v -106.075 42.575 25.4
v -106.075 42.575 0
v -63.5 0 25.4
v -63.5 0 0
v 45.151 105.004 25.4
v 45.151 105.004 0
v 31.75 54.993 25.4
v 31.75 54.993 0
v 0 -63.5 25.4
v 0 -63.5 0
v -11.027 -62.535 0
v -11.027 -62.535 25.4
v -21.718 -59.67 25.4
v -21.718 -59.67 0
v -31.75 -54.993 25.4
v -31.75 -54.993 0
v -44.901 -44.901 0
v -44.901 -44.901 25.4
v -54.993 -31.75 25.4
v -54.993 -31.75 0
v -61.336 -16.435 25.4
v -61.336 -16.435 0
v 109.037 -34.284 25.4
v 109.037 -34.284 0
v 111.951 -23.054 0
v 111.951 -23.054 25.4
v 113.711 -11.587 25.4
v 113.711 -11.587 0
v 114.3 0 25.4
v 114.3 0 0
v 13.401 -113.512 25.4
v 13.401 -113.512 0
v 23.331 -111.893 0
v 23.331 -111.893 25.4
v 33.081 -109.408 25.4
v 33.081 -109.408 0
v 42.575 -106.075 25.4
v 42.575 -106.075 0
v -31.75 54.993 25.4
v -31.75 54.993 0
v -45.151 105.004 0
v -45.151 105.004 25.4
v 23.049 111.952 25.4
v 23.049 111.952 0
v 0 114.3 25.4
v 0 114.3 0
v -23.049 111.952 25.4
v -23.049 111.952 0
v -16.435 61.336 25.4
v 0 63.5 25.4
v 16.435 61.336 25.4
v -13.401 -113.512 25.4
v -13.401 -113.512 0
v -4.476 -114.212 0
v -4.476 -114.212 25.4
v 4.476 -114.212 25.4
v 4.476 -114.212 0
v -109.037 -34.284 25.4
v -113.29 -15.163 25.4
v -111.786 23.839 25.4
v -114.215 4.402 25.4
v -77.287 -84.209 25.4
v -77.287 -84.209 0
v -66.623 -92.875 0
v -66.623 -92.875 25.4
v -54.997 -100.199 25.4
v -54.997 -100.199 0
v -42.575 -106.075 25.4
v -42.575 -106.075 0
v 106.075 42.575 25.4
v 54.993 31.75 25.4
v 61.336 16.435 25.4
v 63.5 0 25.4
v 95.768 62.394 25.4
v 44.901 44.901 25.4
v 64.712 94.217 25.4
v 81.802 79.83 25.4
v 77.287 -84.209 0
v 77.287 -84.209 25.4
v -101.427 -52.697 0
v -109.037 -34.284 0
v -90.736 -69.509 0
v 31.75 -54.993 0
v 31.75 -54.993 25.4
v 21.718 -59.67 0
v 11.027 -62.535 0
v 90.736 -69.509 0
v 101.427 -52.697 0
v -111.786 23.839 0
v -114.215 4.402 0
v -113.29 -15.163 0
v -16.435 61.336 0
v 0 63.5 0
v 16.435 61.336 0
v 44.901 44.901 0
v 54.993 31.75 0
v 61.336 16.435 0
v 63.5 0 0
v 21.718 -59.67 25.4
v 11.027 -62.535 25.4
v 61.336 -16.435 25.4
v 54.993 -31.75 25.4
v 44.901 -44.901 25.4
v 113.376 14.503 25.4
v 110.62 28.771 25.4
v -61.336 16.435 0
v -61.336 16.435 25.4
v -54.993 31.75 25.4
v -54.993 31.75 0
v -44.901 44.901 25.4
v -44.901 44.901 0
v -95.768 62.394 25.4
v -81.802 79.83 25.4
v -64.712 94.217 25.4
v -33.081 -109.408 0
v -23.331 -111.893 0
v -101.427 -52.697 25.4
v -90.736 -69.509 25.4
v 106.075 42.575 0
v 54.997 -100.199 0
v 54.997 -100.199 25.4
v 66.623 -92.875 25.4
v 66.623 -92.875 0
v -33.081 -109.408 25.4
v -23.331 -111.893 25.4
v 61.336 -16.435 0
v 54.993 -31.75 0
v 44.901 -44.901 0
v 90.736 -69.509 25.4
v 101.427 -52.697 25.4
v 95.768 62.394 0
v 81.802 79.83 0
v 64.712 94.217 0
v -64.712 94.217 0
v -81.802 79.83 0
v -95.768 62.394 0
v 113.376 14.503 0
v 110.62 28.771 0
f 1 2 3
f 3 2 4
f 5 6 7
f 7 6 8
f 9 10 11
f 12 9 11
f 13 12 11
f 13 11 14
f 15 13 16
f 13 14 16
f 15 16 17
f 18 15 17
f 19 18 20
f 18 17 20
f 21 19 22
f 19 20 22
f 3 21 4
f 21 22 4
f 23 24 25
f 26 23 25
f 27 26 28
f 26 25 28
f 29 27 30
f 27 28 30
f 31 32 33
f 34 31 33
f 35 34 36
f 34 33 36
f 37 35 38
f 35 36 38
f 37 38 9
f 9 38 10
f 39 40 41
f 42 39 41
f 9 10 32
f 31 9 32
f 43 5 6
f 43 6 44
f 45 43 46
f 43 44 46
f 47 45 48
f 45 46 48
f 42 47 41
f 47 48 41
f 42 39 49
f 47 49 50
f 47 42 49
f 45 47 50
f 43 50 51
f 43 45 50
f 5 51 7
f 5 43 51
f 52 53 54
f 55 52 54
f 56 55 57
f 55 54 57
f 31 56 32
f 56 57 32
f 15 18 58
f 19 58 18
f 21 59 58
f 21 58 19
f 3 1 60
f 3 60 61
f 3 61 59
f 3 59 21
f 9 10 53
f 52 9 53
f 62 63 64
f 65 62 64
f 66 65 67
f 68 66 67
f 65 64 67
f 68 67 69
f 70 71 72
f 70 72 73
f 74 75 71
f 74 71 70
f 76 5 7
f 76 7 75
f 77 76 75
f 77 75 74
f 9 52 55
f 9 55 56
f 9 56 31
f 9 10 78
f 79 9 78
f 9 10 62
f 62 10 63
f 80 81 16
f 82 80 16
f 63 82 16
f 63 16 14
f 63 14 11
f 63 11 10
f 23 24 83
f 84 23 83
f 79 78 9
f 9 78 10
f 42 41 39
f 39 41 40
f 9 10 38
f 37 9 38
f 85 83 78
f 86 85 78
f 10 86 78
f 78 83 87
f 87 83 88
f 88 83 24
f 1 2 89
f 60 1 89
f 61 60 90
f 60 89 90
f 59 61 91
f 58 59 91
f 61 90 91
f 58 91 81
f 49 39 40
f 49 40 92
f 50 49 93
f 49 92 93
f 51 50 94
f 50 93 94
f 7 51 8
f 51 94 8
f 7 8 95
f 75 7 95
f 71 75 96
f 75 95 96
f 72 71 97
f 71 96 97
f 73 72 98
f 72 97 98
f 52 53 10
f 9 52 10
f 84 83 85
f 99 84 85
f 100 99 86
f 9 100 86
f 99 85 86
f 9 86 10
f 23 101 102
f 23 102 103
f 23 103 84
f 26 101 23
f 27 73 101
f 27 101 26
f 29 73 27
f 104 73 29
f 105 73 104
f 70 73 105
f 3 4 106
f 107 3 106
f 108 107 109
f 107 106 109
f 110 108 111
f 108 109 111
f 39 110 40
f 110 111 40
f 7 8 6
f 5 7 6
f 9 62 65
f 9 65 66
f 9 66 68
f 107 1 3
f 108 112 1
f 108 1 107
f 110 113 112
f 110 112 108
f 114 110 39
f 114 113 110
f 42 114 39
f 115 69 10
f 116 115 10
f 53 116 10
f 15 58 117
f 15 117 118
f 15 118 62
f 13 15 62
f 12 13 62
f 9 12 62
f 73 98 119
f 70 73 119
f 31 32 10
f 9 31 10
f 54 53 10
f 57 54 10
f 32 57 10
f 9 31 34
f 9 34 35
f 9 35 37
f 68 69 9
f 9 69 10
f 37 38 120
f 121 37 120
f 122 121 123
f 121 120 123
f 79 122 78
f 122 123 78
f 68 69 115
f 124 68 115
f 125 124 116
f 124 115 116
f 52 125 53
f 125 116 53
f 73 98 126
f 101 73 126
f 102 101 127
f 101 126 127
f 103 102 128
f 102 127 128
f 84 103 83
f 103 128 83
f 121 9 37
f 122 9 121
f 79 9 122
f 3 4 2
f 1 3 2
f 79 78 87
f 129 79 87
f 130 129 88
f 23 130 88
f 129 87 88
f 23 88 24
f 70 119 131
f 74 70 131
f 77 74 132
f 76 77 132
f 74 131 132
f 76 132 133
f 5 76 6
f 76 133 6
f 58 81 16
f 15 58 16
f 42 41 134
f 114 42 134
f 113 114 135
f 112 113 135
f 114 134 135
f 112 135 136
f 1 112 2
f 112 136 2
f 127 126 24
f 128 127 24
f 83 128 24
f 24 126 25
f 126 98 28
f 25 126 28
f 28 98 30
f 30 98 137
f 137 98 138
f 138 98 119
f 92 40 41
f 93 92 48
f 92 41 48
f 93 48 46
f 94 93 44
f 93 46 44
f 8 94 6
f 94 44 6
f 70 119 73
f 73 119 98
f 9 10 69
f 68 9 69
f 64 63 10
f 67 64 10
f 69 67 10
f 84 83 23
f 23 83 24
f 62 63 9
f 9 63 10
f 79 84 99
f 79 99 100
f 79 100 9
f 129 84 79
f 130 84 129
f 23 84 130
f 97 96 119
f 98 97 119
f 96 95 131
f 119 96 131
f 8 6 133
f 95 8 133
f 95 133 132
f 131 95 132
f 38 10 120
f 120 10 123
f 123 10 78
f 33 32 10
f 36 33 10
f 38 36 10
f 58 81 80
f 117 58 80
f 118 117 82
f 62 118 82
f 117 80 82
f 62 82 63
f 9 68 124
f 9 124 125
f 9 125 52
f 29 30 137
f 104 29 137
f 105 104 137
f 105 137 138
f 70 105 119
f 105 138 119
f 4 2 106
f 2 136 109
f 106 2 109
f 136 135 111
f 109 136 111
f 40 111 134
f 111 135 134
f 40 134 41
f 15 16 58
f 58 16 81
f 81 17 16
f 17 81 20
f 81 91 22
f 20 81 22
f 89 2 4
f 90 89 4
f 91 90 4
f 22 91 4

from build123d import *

# Parameters (mm, degrees)
F1_DEPTH = 25.4
F2_DEPTH = 25.4


with BuildPart() as f1:
    # F0 (on Top) → F1 (new body)
    with BuildSketch(Plane.XY):
        with BuildLine():
            Line((-63.5, 0), (-106.0748444331, 42.5748444331))
            ThreePointArc((-106.0748444331, 42.5748444331), (-114.2151898846, 4.4023175283), (-109.0372792311, -34.2835490851))
            Line((-109.0372792311, -34.2835490851), (-31.75, -54.9926131403))
            ThreePointArc((-31.75, -54.9926131403), (-54.9926131403, -31.75), (-63.5, 0))
        make_face()
    extrude(amount=F1_DEPTH)


with BuildPart() as f1b:
    # F0 (on Top) → F1, piece 2 (new body)
    with BuildSketch(Plane.XY):
        with BuildLine():
            Line((-42.5748444331, -106.0748444331), (0, -63.5))
            Line((0, -63.5), (-77.2872792311, -84.2090640552))
            ThreePointArc((-77.2872792311, -84.2090640552), (-60.9201137573, -96.712097174), (-42.5748444331, -106.0748444331))
        make_face()
    extrude(amount=F1_DEPTH)


with BuildPart() as f1c:
    # F0 (on Top) → F1, piece 3 (new body)
    with BuildSketch(Plane.XY):
        with BuildLine():
            Line((13.4006038104, -113.5117342724), (0, -63.5))
            Line((0, -63.5), (-13.4006038104, -113.5117342724))
            ThreePointArc((-13.4006038104, -113.5117342724), (0, -114.3), (13.4006038104, -113.5117342724))
        make_face()
    extrude(amount=F1_DEPTH)


with BuildPart() as f1d:
    # F0 (on Top) → F1, piece 4 (new body)
    with BuildSketch(Plane.XY):
        with BuildLine():
            ThreePointArc((42.5748444331, -106.0748444331), (60.9201137573, -96.712097174), (77.2872792311, -84.2090640552))
            Line((77.2872792311, -84.2090640552), (0, -63.5))
            Line((0, -63.5), (42.5748444331, -106.0748444331))
        make_face()
    extrude(amount=F1_DEPTH)


with BuildPart() as f1e:
    # F0 (on Top) → F1, piece 5 (new body)
    with BuildSketch(Plane.XY):
        with BuildLine():
            ThreePointArc((109.0372792311, -34.2835490851), (112.9766591295, -17.3425630153), (114.3, 0))
            ThreePointArc((114.3, 0), (112.224874067, 21.6810433478), (106.0748444331, 42.5748444331))
            Line((106.0748444331, 42.5748444331), (63.5, 0))
            ThreePointArc((63.5, 0), (54.9926131403, -31.75), (31.75, -54.9926131403))
            Line((31.75, -54.9926131403), (109.0372792311, -34.2835490851))
        make_face()
    extrude(amount=F1_DEPTH)


with BuildPart() as f1f:
    # F0 (on Top) → F1, piece 6 (new body)
    with BuildSketch(Plane.XY):
        with BuildLine():
            Line((31.75, 54.9926131403), (45.1506038104, 105.0043474127))
            ThreePointArc((45.1506038104, 105.0043474127), (0, 114.3), (-45.1506038104, 105.0043474127))
            Line((-45.1506038104, 105.0043474127), (-31.75, 54.9926131403))
            ThreePointArc((-31.75, 54.9926131403), (0, 63.5), (31.75, 54.9926131403))
        make_face()
    extrude(amount=F1_DEPTH)


with BuildPart() as f2:
    # F0 (on Top) → F2 (new body)
    with BuildSketch(Plane.XY):
        with BuildLine():
            Line((-77.2872792311, -84.2090640552), (0, -63.5))
            ThreePointArc((0, -63.5), (-16.435009364, -61.3362899694), (-31.75, -54.9926131403))
            Line((-31.75, -54.9926131403), (-109.0372792311, -34.2835490851))
            ThreePointArc((-109.0372792311, -34.2835490851), (-96.4486886007, -61.3362899694), (-77.2872792311, -84.2090640552))
        make_face()
    extrude(amount=F2_DEPTH)


with BuildPart() as f2b:
    # F0 (on Top) → F2, piece 2 (new body)
    with BuildSketch(Plane.XY):
        with BuildLine():
            Line((-31.75, 54.9926131403), (-45.1506038104, 105.0043474127))
            ThreePointArc((-45.1506038104, 105.0043474127), (-81.8024740437, 79.8301023444), (-106.0748444331, 42.5748444331))
            Line((-106.0748444331, 42.5748444331), (-63.5, 0))
            ThreePointArc((-63.5, 0), (-54.9926131403, 31.75), (-31.75, 54.9926131403))
        make_face()
    extrude(amount=F2_DEPTH)


with BuildPart() as f2c:
    # F0 (on Top) → F2, piece 3 (new body)
    with BuildSketch(Plane.XY):
        with BuildLine():
            Line((63.5, 0), (106.0748444331, 42.5748444331))
            ThreePointArc((106.0748444331, 42.5748444331), (81.8024740437, 79.8301023444), (45.1506038104, 105.0043474127))
            Line((45.1506038104, 105.0043474127), (31.75, 54.9926131403))
            ThreePointArc((31.75, 54.9926131403), (54.9926131403, 31.75), (63.5, 0))
        make_face()
    extrude(amount=F2_DEPTH)


with BuildPart() as f2d:
    # F0 (on Top) → F2, piece 4 (new body)
    with BuildSketch(Plane.XY):
        with BuildLine():
            ThreePointArc((77.2872792311, -84.2090640552), (96.4486886007, -61.3362899694), (109.0372792311, -34.2835490851))
            Line((109.0372792311, -34.2835490851), (31.75, -54.9926131403))
            ThreePointArc((31.75, -54.9926131403), (16.435009364, -61.3362899694), (0, -63.5))
            Line((0, -63.5), (77.2872792311, -84.2090640552))
        make_face()
    extrude(amount=F2_DEPTH)


with BuildPart() as f2e:
    # F0 (on Top) → F2, piece 5 (new body)
    with BuildSketch(Plane.XY):
        with BuildLine():
            Line((42.5748444331, -106.0748444331), (0, -63.5))
            Line((0, -63.5), (13.4006038104, -113.5117342724))
            ThreePointArc((13.4006038104, -113.5117342724), (28.2336595951, -110.7580717865), (42.5748444331, -106.0748444331))
        make_face()
    extrude(amount=F2_DEPTH)


with BuildPart() as f2f:
    # F0 (on Top) → F2, piece 6 (new body)
    with BuildSketch(Plane.XY):
        with BuildLine():
            Line((-13.4006038104, -113.5117342724), (0, -63.5))
            Line((0, -63.5), (-42.5748444331, -106.0748444331))
            ThreePointArc((-42.5748444331, -106.0748444331), (-28.2336595951, -110.7580717865), (-13.4006038104, -113.5117342724))
        make_face()
    extrude(amount=F2_DEPTH)


solid = Compound([f1.part, f1b.part, f1c.part, f1d.part, f1e.part, f1f.part, f2.part, f2b.part, f2c.part, f2d.part, f2e.part, f2f.part])
